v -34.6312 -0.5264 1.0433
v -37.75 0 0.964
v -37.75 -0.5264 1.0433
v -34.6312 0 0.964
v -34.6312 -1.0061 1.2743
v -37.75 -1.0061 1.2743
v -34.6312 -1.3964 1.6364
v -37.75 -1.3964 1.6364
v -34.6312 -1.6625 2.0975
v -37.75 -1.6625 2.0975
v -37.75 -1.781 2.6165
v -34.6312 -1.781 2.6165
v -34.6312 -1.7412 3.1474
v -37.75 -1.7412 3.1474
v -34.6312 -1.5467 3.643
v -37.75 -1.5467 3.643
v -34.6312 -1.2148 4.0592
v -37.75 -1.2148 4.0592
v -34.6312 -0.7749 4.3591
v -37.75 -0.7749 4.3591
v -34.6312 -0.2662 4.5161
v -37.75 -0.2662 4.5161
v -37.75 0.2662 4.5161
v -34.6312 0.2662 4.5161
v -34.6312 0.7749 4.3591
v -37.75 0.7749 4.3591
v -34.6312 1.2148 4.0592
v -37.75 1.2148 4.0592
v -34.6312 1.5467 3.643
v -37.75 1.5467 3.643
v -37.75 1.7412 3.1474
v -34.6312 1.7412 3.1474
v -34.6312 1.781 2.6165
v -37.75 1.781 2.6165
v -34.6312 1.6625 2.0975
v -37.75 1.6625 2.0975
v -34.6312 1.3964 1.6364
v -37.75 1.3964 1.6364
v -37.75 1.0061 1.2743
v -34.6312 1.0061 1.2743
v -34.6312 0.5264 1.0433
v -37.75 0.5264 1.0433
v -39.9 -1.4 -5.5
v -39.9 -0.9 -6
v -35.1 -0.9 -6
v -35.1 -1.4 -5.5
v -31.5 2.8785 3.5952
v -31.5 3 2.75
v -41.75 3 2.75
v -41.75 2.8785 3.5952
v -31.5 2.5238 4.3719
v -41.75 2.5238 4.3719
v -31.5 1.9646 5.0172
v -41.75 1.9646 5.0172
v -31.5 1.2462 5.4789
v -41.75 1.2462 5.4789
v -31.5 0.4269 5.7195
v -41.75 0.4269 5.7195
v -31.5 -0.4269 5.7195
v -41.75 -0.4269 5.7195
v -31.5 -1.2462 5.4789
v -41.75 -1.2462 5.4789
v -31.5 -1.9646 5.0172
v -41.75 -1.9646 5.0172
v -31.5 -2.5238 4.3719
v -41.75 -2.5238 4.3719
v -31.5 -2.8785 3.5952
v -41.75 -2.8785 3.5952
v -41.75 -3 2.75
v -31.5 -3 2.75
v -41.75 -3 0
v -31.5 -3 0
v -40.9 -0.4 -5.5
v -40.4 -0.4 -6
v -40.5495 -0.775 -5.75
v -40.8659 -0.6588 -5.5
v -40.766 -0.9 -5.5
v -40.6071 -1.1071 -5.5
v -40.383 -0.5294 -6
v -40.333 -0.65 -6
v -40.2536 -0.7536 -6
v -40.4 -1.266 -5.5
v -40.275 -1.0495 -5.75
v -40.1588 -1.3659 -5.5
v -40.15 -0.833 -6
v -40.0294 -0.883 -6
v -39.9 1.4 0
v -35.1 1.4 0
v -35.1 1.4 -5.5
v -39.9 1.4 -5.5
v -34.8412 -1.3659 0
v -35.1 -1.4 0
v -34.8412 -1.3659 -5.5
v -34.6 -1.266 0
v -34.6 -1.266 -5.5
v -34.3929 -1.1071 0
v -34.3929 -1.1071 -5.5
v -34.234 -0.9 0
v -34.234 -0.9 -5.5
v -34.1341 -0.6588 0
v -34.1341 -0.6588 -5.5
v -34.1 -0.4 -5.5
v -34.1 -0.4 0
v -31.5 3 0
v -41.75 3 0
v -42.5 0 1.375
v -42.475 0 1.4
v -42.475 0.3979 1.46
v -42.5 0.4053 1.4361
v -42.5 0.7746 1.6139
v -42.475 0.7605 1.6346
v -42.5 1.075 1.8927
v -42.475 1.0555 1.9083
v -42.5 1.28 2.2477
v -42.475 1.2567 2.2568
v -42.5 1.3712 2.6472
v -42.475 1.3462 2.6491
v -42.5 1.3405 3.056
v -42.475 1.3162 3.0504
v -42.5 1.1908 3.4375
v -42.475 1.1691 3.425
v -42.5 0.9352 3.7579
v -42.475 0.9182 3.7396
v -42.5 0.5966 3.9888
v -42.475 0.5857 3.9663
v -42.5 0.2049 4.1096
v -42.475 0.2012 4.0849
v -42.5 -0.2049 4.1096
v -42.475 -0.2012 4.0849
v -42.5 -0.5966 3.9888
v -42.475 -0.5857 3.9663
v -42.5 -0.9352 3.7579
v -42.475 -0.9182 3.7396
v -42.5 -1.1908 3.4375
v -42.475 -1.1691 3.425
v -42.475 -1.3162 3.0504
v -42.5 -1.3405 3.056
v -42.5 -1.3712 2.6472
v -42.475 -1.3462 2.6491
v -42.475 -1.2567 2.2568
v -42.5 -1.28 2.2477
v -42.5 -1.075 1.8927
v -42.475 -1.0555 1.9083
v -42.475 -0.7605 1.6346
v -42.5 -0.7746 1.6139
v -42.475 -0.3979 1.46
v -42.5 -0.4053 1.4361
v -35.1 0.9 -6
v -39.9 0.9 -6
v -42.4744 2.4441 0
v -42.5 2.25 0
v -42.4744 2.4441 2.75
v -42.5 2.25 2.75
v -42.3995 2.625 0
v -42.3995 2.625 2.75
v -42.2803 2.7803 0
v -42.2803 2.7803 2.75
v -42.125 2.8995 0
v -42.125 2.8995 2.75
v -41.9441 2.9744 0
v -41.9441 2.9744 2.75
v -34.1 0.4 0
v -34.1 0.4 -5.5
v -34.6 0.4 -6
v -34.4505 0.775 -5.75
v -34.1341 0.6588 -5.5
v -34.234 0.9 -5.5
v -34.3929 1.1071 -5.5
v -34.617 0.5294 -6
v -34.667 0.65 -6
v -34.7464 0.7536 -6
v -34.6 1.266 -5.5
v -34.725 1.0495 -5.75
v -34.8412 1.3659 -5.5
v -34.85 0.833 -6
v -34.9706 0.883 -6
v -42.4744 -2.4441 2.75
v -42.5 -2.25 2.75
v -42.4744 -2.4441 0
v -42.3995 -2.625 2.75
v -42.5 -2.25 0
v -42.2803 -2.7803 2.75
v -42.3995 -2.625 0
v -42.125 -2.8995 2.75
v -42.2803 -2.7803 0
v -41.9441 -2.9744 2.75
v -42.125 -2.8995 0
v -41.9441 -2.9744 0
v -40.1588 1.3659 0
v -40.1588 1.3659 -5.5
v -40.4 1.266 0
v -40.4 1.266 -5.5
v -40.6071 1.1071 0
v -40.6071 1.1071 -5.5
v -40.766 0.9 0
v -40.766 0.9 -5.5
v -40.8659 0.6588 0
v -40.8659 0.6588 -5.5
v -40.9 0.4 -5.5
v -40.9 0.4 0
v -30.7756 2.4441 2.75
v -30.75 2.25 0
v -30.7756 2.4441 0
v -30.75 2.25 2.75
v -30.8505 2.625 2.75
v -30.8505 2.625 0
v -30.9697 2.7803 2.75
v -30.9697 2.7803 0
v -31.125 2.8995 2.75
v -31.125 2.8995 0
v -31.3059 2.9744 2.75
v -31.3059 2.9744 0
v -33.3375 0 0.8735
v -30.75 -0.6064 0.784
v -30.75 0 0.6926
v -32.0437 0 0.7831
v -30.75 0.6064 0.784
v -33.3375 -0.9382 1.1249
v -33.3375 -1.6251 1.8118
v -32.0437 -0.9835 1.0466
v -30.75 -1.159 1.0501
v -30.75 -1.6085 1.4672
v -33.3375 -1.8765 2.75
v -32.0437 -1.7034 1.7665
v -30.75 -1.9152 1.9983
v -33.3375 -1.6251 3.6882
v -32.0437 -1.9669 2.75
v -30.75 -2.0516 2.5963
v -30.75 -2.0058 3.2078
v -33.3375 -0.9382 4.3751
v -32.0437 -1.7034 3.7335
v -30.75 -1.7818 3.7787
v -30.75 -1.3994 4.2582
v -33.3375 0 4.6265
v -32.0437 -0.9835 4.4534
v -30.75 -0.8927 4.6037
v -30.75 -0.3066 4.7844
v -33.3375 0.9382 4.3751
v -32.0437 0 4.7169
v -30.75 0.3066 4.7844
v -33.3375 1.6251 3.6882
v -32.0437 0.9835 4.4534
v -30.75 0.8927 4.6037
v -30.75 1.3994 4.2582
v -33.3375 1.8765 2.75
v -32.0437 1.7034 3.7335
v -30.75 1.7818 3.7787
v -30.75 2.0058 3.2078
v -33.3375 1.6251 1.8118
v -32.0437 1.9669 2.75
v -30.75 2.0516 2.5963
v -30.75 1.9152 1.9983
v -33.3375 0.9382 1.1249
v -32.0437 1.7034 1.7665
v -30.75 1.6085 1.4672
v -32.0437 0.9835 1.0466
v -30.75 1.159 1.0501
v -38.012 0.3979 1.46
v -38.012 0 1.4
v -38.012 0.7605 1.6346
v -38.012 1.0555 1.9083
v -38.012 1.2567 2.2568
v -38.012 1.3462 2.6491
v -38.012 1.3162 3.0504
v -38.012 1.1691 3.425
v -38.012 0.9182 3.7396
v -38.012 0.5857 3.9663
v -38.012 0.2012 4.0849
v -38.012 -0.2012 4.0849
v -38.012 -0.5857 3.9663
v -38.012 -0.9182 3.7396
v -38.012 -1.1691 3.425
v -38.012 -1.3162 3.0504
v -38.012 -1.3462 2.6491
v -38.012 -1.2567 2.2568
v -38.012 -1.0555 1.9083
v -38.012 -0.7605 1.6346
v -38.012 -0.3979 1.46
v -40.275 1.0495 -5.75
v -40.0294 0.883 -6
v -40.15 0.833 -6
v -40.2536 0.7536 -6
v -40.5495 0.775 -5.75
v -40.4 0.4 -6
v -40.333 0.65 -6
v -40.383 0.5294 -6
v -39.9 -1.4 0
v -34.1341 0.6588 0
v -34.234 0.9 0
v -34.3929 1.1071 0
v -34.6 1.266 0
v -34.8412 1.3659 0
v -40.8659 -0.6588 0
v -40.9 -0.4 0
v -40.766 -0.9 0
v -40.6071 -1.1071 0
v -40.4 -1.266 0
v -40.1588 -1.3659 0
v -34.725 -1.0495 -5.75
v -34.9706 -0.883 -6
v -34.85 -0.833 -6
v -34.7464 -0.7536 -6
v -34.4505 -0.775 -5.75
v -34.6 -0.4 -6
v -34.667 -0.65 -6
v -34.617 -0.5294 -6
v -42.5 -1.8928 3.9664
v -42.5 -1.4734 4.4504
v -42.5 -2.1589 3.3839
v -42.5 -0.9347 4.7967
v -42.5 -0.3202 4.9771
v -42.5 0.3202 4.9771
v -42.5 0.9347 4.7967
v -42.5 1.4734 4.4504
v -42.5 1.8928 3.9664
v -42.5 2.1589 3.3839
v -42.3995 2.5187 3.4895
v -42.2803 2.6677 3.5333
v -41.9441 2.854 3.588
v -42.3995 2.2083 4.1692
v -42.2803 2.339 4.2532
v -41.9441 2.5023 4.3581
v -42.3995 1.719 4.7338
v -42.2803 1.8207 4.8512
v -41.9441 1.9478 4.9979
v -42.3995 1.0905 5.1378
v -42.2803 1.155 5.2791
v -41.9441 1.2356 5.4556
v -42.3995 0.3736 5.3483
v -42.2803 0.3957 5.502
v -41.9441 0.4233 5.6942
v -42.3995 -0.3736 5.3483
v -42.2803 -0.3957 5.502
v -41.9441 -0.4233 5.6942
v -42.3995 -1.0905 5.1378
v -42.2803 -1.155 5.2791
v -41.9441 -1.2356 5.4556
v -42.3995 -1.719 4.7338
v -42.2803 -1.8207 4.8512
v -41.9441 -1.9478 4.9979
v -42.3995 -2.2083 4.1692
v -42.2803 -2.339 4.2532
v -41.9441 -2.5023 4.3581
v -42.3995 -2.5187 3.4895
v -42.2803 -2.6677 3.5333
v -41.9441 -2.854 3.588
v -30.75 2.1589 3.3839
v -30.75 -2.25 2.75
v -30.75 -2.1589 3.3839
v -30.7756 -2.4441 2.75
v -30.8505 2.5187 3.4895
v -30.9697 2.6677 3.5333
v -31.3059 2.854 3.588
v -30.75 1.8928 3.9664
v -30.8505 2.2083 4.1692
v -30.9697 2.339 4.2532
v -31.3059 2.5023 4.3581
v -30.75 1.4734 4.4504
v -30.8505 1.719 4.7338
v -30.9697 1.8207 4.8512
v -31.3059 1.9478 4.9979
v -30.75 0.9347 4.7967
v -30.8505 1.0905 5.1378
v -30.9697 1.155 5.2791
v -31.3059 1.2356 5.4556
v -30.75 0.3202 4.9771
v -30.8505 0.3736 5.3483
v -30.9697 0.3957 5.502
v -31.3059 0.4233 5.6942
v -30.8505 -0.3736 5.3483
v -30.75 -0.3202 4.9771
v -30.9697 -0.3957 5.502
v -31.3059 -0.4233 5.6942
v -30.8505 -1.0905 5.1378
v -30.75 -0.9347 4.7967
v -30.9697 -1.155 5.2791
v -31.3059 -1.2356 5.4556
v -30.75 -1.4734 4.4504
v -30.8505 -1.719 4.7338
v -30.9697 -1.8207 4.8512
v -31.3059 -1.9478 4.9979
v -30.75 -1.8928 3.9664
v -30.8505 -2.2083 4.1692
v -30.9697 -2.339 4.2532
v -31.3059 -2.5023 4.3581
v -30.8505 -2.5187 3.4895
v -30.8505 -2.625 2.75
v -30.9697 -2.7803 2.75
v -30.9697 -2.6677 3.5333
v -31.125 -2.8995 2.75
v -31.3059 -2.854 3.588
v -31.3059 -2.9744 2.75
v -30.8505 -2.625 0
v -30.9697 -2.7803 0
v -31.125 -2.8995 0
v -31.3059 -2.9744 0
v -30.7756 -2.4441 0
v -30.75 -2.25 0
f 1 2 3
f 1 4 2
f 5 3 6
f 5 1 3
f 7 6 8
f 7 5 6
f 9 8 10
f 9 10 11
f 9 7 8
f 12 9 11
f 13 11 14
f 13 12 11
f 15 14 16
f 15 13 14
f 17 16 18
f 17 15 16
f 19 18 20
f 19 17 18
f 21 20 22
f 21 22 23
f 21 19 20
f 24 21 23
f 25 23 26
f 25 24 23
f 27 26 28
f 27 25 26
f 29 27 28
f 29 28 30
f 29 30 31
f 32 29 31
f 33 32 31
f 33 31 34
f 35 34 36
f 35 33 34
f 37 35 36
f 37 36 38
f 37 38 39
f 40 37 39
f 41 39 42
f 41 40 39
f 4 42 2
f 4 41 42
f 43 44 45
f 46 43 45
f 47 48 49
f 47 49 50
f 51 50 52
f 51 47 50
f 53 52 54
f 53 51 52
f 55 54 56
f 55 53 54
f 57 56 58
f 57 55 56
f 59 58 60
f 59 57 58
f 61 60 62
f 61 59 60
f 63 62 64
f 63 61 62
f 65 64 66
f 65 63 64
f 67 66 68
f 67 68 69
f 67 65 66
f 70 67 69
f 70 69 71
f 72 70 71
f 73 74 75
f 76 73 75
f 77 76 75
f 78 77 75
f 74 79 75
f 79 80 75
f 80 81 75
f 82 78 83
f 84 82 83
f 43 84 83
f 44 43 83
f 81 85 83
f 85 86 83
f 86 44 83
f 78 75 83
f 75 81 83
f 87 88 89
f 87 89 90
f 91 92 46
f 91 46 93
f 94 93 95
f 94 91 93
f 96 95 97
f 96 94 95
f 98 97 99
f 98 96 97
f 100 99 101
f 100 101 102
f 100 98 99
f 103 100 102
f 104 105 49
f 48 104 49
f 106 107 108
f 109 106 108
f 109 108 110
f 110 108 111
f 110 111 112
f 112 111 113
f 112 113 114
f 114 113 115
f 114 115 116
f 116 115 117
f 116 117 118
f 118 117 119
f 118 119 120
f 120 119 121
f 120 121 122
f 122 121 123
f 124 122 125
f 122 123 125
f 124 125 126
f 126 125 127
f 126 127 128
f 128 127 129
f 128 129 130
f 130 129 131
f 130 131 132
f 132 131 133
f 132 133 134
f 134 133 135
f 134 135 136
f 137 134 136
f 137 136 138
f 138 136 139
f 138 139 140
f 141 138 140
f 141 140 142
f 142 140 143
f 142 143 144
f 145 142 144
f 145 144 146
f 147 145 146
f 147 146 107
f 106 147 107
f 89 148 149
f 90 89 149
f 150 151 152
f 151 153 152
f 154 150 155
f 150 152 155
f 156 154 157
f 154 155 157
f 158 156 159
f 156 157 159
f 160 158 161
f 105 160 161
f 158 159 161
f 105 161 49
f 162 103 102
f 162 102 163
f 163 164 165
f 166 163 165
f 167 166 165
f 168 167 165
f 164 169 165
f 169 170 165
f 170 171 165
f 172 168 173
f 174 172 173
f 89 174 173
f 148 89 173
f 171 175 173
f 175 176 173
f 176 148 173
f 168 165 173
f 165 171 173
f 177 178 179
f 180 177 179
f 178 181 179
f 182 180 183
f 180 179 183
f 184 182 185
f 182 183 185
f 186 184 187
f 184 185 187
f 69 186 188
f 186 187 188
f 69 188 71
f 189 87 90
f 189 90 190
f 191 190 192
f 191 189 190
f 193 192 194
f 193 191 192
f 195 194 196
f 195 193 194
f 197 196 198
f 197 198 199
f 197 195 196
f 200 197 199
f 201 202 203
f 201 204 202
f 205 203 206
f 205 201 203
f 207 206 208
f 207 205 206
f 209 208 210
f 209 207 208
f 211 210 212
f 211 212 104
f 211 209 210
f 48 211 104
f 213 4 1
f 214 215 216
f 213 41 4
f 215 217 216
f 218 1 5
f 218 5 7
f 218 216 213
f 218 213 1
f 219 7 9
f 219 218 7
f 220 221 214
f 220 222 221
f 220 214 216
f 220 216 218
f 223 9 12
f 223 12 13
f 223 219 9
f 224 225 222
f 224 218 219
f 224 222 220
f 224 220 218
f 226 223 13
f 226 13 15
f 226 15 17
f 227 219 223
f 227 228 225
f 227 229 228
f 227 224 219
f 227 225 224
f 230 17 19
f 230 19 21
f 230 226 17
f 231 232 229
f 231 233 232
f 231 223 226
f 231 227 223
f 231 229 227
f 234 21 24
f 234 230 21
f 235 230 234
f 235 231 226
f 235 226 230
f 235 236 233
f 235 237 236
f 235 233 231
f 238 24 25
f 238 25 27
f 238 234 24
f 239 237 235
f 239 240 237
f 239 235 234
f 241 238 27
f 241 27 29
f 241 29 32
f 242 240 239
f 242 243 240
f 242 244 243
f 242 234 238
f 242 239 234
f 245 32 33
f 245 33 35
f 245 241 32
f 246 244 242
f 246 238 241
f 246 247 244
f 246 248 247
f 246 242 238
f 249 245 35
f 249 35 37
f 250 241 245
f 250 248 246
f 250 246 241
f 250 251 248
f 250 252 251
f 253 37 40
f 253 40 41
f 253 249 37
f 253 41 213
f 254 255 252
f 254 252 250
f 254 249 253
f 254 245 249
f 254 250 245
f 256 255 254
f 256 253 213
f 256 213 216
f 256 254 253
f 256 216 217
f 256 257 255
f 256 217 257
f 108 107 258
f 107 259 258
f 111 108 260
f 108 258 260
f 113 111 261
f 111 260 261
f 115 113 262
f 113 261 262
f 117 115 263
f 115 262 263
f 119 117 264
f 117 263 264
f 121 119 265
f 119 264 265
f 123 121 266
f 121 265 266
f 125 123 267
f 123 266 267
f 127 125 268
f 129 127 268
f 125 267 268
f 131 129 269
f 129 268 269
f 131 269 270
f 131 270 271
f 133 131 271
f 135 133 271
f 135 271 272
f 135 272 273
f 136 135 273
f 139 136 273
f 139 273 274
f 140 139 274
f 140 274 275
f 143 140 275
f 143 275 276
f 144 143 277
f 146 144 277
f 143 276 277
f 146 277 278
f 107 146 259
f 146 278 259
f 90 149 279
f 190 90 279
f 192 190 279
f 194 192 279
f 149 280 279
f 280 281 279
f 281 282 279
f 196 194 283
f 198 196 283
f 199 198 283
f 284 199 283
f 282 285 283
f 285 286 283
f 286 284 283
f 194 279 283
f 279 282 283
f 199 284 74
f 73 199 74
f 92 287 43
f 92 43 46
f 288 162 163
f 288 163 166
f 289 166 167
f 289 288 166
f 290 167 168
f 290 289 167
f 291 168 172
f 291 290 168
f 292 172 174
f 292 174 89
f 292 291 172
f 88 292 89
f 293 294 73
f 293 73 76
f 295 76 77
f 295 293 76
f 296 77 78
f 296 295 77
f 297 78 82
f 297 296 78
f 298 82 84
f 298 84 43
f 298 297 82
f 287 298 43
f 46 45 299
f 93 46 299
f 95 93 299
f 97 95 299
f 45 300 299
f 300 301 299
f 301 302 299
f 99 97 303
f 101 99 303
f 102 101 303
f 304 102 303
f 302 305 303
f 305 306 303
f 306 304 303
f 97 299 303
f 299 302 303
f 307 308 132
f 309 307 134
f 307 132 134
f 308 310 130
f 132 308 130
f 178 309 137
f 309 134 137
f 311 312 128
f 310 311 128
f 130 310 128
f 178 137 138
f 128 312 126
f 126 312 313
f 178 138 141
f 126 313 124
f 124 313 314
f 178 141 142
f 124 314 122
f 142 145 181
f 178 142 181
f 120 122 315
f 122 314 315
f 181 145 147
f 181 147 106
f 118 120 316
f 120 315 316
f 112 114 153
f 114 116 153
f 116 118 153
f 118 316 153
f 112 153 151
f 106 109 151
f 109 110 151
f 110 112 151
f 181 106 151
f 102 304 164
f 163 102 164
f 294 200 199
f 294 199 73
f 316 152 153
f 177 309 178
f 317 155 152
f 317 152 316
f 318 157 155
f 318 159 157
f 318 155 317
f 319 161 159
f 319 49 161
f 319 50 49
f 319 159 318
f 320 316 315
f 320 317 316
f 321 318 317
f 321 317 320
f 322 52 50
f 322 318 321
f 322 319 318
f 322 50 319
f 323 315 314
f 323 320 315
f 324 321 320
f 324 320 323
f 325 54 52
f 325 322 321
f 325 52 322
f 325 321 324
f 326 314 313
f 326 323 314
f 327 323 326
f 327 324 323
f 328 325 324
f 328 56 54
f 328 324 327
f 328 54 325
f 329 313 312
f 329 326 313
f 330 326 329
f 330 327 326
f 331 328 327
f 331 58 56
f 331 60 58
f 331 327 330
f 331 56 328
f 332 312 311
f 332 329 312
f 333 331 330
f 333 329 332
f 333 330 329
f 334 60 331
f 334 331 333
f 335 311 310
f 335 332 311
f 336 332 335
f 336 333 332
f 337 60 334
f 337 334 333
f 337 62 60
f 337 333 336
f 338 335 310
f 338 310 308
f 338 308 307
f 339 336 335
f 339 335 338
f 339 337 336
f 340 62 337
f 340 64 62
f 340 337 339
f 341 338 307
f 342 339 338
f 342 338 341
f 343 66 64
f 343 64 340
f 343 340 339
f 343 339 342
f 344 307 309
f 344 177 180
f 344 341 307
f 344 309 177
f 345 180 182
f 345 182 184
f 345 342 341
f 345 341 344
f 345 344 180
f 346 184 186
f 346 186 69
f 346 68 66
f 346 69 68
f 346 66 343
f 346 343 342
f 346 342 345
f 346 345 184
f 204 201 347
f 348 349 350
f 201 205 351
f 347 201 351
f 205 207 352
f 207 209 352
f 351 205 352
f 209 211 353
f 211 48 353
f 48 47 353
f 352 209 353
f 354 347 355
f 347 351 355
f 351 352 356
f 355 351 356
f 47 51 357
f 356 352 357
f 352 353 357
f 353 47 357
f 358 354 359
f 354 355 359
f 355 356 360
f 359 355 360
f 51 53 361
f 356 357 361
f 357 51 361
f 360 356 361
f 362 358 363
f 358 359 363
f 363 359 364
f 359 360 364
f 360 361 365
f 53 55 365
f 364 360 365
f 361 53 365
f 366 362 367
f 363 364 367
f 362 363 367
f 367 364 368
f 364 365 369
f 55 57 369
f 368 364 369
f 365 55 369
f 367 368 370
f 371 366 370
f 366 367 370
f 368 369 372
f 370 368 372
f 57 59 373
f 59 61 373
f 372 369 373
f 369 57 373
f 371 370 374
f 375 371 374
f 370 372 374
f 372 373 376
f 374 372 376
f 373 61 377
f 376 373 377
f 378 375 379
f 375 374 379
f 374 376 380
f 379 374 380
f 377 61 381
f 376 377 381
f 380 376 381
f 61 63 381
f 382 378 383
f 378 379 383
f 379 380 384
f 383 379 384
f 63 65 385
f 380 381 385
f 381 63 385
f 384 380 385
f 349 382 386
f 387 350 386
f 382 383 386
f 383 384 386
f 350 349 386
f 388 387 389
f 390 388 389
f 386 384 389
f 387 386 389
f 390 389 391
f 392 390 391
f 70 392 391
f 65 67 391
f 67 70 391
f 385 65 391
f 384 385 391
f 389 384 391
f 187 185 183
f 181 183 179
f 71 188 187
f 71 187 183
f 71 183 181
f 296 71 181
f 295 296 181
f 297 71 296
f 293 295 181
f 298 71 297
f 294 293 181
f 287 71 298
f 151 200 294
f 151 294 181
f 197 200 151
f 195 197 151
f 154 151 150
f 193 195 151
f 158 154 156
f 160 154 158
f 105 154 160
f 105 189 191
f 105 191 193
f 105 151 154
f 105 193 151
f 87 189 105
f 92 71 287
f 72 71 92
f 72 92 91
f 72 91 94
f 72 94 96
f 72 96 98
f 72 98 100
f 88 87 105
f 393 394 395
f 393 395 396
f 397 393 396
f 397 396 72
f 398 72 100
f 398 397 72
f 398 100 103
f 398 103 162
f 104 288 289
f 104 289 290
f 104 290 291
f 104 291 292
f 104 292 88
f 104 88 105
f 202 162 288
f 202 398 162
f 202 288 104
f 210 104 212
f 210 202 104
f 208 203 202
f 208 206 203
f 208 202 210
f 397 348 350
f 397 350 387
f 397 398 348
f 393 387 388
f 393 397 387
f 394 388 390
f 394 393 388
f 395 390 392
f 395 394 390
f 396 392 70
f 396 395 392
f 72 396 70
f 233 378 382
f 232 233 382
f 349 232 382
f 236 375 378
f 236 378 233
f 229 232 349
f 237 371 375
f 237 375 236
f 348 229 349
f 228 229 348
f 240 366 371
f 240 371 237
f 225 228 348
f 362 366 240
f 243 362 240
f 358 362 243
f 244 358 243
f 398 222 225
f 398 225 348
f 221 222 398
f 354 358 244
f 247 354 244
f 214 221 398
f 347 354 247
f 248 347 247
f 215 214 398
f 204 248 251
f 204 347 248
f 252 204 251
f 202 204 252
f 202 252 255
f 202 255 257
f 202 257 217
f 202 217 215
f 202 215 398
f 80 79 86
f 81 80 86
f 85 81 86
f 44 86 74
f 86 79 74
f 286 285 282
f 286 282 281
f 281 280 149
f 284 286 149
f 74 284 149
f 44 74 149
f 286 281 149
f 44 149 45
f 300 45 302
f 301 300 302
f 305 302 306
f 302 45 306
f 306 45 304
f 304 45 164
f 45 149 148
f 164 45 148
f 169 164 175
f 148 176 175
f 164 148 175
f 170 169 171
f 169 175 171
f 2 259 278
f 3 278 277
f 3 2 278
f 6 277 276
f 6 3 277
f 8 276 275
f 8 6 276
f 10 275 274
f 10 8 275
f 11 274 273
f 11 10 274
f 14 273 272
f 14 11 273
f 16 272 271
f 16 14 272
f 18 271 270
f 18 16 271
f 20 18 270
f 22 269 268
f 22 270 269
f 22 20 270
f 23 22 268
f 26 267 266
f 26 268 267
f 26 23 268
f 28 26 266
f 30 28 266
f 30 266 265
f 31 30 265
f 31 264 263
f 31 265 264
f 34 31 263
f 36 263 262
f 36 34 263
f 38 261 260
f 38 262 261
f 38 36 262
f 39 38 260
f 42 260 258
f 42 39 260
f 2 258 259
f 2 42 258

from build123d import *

# Parameters (mm, degrees)
BODY_START                       = 1.25
BODY_DEPTH                       = 11.75
PEG_DEPTH                        = 6
CHAMFER1_SIZE                    = 0.5
M2_5_CLEARANCE_HOLE1_D           = 2.7
M2_5_CLEARANCE_HOLE1_CSINK_D     = 2.75
M2_5_CLEARANCE_HOLE1_CSINK_ANGLE = 90
FILLET3_R                        = 0.75


with BuildPart() as part:
    # Sketch2 → body (new body)
    with BuildSketch(Plane.ZY.offset(29.5).offset(BODY_START)):
        with BuildLine():
            Line((2.75, -3), (0, -3))
            Line((0, -3), (0, 3))
            Line((0, 3), (2.75, 3))
            ThreePointArc((2.75, 3), (5.75, 0), (2.75, -3))
        make_face()
    extrude(amount=BODY_DEPTH)

    # Sketch3 → peg (add)
    with BuildSketch(Plane(origin=(0, 0, 0), x_dir=(-1, 0, 0), z_dir=(0, 0, -1))):
        with BuildLine():
            Line((35.1, 1.4), (39.9, 1.4))
            ThreePointArc((39.9, 1.4), (40.607106781, 1.107106781), (40.9, 0.4))
            Line((40.9, 0.4), (40.9, -0.4))
            ThreePointArc((40.9, -0.4), (40.607106781, -1.107106781), (39.9, -1.4))
            Line((39.9, -1.4), (35.1, -1.4))
            ThreePointArc((35.1, -1.4), (34.392893219, -1.107106781), (34.1, -0.4))
            Line((34.1, -0.4), (34.1, 0.4))
            ThreePointArc((34.1, 0.4), (34.392893219, 1.107106781), (35.1, 1.4))
        make_face()
    extrude(amount=PEG_DEPTH)

    # Chamfer1
    chamfer1_edges = [part.edges().sort_by_distance(p)[0] for p in [
        (-34.392893219, 1.107106781, -6),
        (-34.1, 0, -6),
        (-34.392893219, -1.107106781, -6),
        (-37.5, -1.4, -6),
        (-40.607106781, -1.107106781, -6),
        (-40.9, 0, -6),
        (-40.607106781, 1.107106781, -6),
        (-37.5, 1.4, -6),
    ]]
    chamfer(chamfer1_edges, length=CHAMFER1_SIZE)

    # Sketch5 → 9/64 (0.14063) Diameter Hole1 (revolve, cut)
    with BuildSketch(Plane(origin=(-30.75, 0, 2.75), x_dir=(0, 0, -1), z_dir=(0, 1, 0))):
        Polygon((0, 0), (0, 8.073137666), (1.786001, 7), (1.786001, 3.881186521), (2.0574, 0), align=None)
    revolve(axis=Axis((-24.4, 0, 2.75), (-1, 0, 0)), mode=Mode.SUBTRACT)

    # M2.5 Clearance Hole1 (through all)
    with Locations(Plane.ZY.offset(42.5)):
        with Locations((2.75, 0)):
            CounterSinkHole(M2_5_CLEARANCE_HOLE1_D / 2, M2_5_CLEARANCE_HOLE1_CSINK_D / 2, counter_sink_angle=M2_5_CLEARANCE_HOLE1_CSINK_ANGLE)

    # Fillet3
    fillet3_edges = [part.edges().sort_by_distance(p)[0] for p in [
        (-42.5, -3, 1.375),
        (-42.5, 0, 5.75),
        (-30.75, -3, 1.375),
        (-30.75, 3, 1.375),
        (-30.75, 0, 5.75),
        (-42.5, 3, 1.375),
    ]]
    fillet(fillet3_edges, radius=FILLET3_R)


solid = part.part
